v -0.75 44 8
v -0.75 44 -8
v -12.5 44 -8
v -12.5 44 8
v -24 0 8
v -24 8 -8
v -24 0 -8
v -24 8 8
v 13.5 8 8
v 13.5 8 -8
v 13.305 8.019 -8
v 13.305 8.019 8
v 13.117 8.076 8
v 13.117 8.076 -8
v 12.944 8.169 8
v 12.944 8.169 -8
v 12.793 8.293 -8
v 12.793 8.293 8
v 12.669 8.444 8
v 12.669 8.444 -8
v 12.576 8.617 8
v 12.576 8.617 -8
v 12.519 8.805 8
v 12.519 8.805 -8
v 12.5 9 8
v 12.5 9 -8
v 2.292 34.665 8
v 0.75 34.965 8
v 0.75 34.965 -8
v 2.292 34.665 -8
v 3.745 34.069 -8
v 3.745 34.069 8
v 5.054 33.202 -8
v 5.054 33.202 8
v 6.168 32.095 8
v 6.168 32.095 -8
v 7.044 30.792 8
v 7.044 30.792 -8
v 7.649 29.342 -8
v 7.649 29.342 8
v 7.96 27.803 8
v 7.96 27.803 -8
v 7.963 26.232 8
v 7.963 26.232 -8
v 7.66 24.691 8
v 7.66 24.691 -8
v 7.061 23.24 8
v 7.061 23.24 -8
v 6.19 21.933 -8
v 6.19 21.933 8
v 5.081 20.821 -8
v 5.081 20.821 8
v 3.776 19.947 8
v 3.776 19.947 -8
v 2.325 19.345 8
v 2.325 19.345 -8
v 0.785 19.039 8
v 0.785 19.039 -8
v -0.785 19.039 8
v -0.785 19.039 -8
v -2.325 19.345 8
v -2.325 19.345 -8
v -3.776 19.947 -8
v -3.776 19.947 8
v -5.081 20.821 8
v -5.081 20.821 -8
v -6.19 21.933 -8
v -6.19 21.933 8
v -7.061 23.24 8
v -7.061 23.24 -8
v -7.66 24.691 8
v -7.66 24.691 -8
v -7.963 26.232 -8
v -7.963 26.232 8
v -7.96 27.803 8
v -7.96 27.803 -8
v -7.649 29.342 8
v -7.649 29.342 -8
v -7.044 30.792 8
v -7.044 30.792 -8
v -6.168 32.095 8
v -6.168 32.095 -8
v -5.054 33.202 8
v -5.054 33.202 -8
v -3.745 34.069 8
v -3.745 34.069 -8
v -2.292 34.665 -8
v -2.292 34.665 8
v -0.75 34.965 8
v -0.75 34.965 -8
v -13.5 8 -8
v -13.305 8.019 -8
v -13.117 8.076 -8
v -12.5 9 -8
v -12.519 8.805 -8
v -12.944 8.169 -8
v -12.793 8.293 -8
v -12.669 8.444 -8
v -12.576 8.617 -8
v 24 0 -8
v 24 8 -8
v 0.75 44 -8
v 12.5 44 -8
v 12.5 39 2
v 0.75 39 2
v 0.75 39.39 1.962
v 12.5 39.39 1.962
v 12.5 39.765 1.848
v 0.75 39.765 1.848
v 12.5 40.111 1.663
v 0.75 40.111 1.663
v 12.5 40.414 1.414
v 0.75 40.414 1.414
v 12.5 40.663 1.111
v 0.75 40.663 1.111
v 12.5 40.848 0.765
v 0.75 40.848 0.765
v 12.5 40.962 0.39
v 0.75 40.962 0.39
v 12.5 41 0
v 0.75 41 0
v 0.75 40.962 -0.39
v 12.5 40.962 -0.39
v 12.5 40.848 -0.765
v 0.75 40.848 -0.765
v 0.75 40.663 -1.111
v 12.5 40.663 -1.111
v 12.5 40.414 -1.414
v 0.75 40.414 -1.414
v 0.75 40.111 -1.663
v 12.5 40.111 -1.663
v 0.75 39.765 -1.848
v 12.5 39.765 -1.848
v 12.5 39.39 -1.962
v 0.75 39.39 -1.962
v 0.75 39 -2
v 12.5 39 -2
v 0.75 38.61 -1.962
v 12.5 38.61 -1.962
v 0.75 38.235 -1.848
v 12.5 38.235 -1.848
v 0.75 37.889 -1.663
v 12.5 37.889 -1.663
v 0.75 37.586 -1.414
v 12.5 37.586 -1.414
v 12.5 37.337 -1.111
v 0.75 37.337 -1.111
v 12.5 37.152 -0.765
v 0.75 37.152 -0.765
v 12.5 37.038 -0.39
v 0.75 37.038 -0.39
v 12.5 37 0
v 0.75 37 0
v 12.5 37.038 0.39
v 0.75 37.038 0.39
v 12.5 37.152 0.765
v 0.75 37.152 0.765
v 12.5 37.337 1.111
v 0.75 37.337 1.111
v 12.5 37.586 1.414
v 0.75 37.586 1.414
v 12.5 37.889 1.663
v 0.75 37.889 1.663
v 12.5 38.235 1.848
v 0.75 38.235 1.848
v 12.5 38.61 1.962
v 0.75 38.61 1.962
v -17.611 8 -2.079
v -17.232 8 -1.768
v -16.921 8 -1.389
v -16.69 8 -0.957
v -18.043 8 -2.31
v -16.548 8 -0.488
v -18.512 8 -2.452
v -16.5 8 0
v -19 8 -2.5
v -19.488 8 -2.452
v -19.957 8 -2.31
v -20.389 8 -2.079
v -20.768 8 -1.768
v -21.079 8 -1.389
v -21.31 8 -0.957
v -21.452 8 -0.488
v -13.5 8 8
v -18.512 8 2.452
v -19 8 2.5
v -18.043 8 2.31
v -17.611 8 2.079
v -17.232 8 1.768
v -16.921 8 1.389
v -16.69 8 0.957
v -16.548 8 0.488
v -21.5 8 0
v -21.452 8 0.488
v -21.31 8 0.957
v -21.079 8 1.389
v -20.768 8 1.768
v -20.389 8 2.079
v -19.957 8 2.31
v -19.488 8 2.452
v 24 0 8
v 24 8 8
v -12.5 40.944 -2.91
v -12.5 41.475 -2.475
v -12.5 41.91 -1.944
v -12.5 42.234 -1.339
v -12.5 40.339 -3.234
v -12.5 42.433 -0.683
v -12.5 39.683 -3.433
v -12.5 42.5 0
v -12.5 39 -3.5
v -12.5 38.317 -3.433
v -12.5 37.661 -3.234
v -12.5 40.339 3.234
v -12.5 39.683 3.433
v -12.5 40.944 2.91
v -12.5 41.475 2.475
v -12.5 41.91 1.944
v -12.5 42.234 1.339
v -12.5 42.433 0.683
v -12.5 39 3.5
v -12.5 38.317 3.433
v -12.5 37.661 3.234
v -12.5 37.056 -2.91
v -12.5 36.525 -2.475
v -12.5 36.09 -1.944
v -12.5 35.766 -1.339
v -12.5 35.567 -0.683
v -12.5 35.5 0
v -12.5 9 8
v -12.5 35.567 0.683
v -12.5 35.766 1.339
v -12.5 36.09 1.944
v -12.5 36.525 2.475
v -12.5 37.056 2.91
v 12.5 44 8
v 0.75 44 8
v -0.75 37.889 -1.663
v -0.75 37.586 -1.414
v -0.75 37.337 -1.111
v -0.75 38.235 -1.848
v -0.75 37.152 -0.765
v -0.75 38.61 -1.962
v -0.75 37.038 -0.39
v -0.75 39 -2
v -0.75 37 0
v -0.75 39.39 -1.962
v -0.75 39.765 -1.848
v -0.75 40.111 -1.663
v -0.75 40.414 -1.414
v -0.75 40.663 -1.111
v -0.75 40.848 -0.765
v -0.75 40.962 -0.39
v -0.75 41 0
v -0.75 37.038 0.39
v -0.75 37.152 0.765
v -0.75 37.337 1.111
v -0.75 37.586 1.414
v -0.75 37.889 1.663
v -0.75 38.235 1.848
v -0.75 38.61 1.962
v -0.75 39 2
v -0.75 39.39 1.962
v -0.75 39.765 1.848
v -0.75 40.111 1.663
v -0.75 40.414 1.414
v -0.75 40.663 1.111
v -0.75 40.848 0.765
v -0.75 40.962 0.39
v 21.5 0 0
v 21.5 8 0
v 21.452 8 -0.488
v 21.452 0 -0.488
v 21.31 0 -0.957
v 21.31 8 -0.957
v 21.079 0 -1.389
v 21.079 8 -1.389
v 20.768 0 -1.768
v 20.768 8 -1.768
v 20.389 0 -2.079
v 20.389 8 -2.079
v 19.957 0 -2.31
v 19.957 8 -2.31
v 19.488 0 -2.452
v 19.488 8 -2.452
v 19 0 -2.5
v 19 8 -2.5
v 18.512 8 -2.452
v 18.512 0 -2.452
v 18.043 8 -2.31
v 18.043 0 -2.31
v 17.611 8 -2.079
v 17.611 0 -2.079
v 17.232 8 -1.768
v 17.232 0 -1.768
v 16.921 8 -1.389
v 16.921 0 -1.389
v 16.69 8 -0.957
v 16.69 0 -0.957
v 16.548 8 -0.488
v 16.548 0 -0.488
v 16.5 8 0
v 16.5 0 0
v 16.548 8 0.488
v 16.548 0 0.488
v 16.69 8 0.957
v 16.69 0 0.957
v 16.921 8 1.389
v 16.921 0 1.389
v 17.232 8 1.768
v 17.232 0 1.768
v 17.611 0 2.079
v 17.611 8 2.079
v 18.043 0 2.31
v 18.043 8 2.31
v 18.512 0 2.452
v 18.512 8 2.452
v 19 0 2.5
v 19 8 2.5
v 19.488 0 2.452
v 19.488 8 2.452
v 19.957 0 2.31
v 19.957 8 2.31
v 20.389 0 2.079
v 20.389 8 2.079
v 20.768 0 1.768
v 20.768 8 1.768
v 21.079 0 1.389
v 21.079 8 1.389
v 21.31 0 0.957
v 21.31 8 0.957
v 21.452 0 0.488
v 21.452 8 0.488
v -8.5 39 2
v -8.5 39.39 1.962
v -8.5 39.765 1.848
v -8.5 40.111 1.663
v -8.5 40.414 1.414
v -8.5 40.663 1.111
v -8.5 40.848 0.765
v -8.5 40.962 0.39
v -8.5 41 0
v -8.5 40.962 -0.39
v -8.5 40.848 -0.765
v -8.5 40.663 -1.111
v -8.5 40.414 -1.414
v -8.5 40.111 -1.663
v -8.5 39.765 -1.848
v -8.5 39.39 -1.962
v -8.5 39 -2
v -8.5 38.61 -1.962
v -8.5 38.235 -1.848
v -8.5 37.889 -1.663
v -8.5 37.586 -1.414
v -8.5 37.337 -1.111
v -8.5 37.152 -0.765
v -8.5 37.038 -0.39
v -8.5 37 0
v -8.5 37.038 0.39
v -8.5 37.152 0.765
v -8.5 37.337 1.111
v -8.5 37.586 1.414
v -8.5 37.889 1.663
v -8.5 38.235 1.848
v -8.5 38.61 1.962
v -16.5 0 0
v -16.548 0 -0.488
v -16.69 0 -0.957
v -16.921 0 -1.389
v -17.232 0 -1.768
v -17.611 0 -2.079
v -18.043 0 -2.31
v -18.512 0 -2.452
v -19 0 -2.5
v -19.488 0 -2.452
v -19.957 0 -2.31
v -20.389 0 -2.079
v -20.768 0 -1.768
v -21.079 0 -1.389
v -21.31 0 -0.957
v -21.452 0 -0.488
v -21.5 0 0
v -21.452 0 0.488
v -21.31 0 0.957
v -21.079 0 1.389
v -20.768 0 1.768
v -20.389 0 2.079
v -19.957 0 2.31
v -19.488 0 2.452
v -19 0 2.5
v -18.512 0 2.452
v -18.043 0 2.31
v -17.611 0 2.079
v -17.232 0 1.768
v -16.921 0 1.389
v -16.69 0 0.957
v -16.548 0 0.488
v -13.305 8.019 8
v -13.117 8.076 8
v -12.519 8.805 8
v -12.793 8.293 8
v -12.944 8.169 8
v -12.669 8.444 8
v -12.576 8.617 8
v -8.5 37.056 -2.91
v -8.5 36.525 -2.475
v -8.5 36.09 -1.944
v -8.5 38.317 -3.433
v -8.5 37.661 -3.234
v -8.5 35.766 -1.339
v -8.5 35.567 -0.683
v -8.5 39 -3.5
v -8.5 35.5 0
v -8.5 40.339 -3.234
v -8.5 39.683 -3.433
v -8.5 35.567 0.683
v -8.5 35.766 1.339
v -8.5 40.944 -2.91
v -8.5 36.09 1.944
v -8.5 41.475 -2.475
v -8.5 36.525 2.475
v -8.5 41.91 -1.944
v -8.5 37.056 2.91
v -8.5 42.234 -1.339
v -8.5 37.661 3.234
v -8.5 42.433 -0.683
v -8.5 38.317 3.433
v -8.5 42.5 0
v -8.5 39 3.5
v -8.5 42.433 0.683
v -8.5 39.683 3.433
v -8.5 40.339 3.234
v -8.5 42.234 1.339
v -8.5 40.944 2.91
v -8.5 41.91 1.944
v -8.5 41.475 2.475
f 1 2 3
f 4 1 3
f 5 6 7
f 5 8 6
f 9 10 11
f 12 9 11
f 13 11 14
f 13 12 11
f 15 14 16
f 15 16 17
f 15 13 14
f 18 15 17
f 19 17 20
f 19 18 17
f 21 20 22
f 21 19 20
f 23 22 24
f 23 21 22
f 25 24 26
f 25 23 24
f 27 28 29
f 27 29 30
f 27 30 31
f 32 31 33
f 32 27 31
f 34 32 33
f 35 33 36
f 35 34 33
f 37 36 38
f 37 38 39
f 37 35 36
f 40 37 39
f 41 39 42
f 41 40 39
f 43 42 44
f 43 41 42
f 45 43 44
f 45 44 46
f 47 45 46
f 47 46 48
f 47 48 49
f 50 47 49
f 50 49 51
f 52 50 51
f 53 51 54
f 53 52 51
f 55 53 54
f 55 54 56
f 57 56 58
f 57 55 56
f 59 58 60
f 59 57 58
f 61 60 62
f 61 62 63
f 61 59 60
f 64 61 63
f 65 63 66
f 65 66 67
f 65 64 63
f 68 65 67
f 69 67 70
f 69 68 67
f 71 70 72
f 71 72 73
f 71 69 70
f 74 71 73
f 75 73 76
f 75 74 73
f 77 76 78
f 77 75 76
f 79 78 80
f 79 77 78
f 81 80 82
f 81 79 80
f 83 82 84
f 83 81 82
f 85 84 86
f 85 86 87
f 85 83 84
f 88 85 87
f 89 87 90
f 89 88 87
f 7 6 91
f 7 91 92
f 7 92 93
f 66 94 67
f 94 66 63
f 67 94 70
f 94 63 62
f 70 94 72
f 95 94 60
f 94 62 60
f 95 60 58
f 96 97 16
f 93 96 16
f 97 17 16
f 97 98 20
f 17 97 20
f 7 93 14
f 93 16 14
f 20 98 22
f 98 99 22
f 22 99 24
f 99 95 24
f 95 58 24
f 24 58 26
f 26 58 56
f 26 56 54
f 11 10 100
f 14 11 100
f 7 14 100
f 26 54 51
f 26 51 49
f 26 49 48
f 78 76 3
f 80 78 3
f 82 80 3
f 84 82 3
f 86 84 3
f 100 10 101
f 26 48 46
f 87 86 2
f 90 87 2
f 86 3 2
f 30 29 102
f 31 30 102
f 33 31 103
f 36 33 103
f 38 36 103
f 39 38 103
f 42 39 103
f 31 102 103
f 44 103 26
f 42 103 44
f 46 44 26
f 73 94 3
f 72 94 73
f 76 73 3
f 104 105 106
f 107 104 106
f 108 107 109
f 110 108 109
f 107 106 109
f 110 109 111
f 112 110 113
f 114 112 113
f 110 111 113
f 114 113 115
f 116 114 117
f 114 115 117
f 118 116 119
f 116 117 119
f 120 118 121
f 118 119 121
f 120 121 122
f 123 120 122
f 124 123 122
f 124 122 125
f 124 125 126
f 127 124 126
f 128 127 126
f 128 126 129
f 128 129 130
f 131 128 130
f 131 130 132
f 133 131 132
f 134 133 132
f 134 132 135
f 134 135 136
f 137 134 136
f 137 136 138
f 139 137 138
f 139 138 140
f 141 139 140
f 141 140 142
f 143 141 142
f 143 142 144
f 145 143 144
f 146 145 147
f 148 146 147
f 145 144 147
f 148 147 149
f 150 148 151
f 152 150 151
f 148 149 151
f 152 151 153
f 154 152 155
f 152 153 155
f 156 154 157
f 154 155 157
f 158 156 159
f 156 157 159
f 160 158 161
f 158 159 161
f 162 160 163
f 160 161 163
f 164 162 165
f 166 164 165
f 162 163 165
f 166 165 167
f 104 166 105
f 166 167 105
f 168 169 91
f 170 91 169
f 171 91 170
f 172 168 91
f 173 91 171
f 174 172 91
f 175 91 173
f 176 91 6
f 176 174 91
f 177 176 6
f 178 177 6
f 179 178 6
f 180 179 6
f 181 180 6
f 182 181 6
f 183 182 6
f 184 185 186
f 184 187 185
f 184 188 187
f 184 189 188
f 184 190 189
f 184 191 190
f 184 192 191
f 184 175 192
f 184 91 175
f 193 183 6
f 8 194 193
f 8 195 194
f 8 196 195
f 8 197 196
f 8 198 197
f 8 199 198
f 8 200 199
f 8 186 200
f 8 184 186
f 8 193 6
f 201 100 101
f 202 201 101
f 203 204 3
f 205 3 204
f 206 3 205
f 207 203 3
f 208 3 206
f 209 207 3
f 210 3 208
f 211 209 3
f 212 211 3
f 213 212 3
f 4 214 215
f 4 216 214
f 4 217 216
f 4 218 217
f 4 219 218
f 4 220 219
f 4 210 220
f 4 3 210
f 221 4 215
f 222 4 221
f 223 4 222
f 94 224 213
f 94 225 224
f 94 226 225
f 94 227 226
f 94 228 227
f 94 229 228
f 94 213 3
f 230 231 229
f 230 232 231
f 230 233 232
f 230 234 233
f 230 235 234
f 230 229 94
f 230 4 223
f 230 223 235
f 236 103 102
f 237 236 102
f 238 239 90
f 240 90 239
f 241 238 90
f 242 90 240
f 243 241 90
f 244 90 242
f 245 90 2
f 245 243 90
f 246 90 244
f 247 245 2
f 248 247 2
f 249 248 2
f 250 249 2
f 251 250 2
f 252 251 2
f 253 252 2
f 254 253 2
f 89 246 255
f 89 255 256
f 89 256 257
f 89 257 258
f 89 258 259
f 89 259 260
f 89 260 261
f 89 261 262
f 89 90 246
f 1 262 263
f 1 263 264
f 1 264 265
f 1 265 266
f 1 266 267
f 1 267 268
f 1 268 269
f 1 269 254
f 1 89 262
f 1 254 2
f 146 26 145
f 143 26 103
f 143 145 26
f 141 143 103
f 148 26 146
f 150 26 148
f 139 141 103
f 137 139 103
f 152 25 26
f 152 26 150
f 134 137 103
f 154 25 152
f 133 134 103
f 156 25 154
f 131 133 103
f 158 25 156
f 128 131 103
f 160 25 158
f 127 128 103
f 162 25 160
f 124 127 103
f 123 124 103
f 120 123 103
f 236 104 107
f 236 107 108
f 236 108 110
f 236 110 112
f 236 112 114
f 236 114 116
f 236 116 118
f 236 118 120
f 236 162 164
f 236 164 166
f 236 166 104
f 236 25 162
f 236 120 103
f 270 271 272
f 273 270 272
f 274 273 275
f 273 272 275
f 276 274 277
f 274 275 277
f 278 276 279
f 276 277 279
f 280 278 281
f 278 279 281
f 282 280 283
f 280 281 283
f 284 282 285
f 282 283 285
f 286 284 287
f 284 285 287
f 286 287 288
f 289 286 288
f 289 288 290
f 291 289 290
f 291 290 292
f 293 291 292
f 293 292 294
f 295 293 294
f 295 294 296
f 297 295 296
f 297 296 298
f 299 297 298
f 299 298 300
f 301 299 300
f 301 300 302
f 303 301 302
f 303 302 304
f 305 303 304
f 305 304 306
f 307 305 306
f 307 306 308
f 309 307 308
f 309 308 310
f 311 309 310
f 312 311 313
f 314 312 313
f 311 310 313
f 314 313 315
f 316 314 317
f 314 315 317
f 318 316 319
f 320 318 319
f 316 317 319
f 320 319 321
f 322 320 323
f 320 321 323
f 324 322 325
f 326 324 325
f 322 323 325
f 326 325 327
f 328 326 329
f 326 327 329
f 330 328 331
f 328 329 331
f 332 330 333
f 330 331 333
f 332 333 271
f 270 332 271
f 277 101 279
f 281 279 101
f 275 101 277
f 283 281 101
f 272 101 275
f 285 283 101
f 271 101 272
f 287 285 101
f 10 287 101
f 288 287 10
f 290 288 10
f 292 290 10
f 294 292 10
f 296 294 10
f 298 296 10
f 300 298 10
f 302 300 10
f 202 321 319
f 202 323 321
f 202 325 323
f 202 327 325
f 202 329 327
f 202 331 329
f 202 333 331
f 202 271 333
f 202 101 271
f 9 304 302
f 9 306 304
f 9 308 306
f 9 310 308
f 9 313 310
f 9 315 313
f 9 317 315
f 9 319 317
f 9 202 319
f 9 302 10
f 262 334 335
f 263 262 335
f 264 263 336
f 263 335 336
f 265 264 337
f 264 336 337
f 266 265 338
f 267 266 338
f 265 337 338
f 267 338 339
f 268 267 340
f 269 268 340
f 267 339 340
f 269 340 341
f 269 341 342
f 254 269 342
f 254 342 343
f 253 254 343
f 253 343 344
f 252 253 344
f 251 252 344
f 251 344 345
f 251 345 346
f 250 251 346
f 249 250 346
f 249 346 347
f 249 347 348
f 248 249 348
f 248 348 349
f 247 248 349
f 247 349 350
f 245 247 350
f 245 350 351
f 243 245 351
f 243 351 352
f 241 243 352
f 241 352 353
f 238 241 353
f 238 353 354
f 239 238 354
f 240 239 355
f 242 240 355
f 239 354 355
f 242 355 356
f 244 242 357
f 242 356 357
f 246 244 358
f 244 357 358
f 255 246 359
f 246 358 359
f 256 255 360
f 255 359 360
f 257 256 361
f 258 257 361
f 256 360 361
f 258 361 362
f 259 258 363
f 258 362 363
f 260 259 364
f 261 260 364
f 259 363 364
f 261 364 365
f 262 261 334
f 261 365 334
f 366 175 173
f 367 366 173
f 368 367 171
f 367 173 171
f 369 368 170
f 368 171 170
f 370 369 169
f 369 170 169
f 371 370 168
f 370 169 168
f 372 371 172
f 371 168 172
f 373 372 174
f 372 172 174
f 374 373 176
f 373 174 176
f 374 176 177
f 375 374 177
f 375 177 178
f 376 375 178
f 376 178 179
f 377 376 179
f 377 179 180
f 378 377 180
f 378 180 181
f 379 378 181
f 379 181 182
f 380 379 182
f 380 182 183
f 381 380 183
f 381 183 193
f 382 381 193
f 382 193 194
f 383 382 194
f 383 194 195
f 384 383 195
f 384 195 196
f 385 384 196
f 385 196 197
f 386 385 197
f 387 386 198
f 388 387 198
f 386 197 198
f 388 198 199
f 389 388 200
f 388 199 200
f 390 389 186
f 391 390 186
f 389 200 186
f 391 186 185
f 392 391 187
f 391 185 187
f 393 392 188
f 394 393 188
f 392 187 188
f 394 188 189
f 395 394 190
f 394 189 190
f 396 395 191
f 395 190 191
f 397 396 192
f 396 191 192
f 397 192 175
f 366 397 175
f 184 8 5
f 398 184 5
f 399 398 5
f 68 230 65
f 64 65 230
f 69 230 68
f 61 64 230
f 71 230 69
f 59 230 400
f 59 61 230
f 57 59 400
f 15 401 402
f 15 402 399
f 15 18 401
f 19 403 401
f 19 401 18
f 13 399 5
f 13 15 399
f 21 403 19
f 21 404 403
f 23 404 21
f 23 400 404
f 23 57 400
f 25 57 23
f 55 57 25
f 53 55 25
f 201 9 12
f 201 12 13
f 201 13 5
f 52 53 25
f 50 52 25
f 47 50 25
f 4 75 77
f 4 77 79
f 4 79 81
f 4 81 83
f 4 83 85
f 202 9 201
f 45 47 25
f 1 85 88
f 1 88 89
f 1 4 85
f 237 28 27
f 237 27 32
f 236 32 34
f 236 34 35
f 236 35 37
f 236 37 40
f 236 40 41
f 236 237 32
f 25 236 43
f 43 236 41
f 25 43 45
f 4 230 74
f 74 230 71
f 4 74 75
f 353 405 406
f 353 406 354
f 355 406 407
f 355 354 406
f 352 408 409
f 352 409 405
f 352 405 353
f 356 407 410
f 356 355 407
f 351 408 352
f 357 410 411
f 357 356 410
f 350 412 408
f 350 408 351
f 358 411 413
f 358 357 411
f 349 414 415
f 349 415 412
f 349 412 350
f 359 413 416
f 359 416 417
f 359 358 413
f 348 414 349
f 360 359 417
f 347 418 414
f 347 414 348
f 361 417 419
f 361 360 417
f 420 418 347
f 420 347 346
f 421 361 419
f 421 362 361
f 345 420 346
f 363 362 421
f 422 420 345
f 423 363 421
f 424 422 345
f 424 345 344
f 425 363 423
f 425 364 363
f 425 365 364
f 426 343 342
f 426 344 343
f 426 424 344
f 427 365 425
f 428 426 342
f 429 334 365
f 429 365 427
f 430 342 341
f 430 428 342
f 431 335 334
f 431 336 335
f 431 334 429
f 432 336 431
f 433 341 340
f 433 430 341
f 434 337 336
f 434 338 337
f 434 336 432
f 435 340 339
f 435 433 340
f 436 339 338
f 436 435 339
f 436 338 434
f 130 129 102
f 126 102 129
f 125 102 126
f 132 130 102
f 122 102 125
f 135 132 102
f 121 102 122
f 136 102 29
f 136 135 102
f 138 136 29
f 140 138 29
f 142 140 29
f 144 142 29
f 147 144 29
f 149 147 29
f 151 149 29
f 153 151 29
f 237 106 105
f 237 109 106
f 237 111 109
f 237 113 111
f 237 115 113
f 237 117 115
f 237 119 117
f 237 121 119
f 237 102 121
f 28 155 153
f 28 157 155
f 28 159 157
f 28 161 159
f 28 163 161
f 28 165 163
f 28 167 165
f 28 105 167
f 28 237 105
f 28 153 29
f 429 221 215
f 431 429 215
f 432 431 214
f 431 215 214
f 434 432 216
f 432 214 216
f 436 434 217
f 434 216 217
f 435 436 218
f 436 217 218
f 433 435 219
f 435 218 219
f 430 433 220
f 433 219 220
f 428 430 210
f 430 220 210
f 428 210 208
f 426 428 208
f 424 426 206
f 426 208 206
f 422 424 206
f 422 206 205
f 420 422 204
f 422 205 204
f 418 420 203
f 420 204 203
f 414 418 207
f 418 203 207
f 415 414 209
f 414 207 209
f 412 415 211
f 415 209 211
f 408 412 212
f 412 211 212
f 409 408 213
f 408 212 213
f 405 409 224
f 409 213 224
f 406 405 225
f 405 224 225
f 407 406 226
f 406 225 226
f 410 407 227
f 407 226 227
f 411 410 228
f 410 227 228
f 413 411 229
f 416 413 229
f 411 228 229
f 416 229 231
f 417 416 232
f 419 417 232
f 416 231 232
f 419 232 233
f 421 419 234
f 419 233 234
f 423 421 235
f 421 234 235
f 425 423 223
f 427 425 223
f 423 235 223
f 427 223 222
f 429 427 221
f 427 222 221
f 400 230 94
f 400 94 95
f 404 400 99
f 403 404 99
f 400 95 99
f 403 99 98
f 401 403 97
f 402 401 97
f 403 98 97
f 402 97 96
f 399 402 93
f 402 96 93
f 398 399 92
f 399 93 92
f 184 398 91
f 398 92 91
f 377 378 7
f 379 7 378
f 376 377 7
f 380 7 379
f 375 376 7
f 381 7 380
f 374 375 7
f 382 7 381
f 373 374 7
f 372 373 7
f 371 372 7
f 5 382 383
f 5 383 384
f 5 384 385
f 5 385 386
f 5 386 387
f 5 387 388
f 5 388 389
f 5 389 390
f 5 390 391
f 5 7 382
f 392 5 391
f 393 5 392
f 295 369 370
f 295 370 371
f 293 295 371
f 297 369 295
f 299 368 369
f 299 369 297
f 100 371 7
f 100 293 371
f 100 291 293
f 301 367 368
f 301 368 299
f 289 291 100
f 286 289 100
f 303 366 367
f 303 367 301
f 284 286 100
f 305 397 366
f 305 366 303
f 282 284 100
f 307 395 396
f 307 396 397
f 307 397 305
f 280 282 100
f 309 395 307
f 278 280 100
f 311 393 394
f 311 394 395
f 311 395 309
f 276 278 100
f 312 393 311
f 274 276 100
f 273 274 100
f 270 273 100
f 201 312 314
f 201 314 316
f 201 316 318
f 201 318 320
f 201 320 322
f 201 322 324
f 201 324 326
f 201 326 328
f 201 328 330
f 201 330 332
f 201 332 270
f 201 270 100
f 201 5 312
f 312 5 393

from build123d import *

# Parameters (mm, degrees)
SALIENTE_EXTRUIR1_DEPTH = 8
CROQUIS3_R              = 2.5
CORTAR_EXTRUIR1_DEPTH   = 9
REDONDEO1_R             = 1
CROQUIS4_R              = 2
CORTAR_EXTRUIR2_DEPTH   = 37.5
CROQUIS5_R              = 3.5
CORTAR_EXTRUIR3_DEPTH   = 4


with BuildPart() as part:
    # Croquis1 → Saliente-Extruir1 (new body, symmetric)
    with BuildSketch(Plane.XY):
        with BuildLine():
            Line((-24, 0), (24, 0))
            Line((24, 0), (24, 8))
            Line((24, 8), (12.5, 8))
            Line((12.5, 8), (12.5, 44))
            Line((12.5, 44), (0.75, 44))
            Line((0.75, 44), (0.75, 34.964766161))
            ThreePointArc((0.75, 34.964766161), (0, 19), (-0.75, 34.964766161))
            Line((-0.75, 34.964766161), (-0.75, 44))
            Line((-0.75, 44), (-12.5, 44))
            Line((-12.5, 44), (-12.5, 8))
            Line((-12.5, 8), (-24, 8))
            Line((-24, 8), (-24, 0))
        make_face()
    extrude(amount=SALIENTE_EXTRUIR1_DEPTH, both=True)

    # Croquis3 → Cortar-Extruir1 (cut, through all)
    with BuildSketch(Plane(origin=(0, 8, 0), x_dir=(1, 0, 0), z_dir=(0, 1, 0))):
        with Locations((-19, 0)):
            Circle(CROQUIS3_R)
        with Locations((19, 0)):
            Circle(CROQUIS3_R)
    extrude(amount=-CORTAR_EXTRUIR1_DEPTH, mode=Mode.SUBTRACT)

    # Redondeo1
    redondeo1_edges = [part.edges().sort_by_distance(p)[0] for p in [
        (-12.5, 8, 0),
        (12.5, 8, 0),
    ]]
    fillet(redondeo1_edges, radius=REDONDEO1_R)

    # Croquis4 → Cortar-Extruir2 (cut, through all)
    with BuildSketch(Plane.ZY.offset(12.5)):
        with Locations((0, 39)):
            Circle(CROQUIS4_R)
    extrude(amount=-CORTAR_EXTRUIR2_DEPTH, mode=Mode.SUBTRACT)

    # Croquis5 → Cortar-Extruir3 (cut)
    with BuildSketch(Plane.ZY.offset(12.5)):
        with Locations((0, 39)):
            Circle(CROQUIS5_R)
    extrude(amount=-CORTAR_EXTRUIR3_DEPTH, mode=Mode.SUBTRACT)


solid = part.part
